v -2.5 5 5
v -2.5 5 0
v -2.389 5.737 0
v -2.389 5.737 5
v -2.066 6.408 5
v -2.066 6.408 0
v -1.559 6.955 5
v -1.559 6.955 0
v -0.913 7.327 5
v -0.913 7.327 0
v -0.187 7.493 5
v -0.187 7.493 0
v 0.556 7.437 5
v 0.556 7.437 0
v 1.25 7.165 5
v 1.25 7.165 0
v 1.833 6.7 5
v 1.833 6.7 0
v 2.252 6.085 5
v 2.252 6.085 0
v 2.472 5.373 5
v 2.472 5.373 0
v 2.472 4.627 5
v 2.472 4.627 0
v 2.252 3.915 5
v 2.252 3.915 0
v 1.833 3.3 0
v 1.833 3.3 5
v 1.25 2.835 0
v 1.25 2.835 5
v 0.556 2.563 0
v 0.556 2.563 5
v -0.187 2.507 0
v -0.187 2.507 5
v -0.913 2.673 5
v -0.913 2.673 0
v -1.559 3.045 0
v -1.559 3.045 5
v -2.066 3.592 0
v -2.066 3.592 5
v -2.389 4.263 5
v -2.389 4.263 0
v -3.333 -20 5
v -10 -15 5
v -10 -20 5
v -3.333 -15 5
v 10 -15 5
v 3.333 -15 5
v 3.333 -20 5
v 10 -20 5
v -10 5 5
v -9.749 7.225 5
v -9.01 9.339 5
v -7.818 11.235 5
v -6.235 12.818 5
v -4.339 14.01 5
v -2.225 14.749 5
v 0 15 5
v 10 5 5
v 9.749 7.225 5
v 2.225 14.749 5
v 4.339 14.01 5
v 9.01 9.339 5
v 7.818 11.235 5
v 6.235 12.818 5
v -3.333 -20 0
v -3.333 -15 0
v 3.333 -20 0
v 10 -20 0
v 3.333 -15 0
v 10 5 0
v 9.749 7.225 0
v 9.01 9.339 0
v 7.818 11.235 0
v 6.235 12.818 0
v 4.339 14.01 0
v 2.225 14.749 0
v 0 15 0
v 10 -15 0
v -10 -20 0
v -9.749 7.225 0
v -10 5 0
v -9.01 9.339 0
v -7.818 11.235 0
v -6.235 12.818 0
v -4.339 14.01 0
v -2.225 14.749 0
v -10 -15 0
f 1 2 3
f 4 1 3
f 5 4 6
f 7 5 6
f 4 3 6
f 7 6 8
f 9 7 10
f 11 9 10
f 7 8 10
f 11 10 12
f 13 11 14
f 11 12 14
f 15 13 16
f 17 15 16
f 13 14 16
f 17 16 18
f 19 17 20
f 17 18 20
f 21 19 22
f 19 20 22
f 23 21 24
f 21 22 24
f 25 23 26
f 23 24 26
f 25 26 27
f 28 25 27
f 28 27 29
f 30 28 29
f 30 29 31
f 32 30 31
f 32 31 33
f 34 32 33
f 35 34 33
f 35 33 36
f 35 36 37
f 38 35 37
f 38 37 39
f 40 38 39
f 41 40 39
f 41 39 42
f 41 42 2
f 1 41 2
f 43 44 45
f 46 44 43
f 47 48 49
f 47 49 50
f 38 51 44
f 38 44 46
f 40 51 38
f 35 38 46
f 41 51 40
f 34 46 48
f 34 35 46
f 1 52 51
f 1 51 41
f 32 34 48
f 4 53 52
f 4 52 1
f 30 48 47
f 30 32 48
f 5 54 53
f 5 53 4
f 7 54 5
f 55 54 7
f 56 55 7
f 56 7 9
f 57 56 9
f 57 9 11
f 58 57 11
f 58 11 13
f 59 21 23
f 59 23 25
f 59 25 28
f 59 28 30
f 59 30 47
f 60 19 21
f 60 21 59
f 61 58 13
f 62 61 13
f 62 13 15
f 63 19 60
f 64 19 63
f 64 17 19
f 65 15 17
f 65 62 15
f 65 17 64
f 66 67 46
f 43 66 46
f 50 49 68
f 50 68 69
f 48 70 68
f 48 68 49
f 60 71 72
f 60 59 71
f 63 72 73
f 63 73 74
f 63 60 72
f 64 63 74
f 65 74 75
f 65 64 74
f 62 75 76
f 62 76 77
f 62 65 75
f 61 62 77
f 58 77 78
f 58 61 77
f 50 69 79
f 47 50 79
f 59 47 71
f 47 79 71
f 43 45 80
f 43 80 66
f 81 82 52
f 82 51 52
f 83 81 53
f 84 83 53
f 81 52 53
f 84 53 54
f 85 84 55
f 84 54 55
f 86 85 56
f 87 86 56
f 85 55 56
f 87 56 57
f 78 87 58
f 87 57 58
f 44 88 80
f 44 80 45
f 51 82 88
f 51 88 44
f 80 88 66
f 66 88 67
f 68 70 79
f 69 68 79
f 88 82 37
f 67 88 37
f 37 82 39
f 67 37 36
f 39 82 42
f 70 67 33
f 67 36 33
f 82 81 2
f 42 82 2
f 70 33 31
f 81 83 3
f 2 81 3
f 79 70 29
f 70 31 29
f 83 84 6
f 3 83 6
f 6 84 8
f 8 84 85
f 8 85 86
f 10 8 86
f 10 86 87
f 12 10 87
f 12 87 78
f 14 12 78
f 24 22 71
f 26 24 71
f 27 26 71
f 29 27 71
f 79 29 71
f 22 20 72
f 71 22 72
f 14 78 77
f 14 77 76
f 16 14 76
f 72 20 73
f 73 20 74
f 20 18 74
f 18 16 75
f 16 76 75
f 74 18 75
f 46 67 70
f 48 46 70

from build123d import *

# Parameters (mm, degrees)
SKETCH1_W           = 20
SKETCH1_H           = 30
BOSS_EXTRUDE1_DEPTH = 5
FILLET2_R           = 10
SKETCH2_R           = 2.5
CUT_EXTRUDE1_DEPTH  = 19.708286934
SKETCH3_W           = 6.666666667
SKETCH3_H           = 5
BOSS_EXTRUDE2_DEPTH = 5


with BuildPart() as part:
    # Sketch1 → Boss-Extrude1 (new body)
    with BuildSketch(Plane.XY):
        Rectangle(SKETCH1_W, SKETCH1_H)
    extrude(amount=BOSS_EXTRUDE1_DEPTH)

    # Fillet2
    fillet2_edges = [part.edges().sort_by_distance(p)[0] for p in [
        (-10, 15, 2.5),
        (10, 15, 2.5),
    ]]
    fillet(fillet2_edges, radius=FILLET2_R - 0.0001)  # a hair under: the kernel refuses the full size

    # Sketch2 → Cut-Extrude1 (cut, through all)
    with BuildSketch(Plane(origin=(0, 0, 0), x_dir=(-1, 0, 0), z_dir=(0, 0, -1))):
        with Locations((0, 5)):
            Circle(SKETCH2_R)
    extrude(amount=-CUT_EXTRUDE1_DEPTH, mode=Mode.SUBTRACT)

    # Sketch3 → Boss-Extrude2 (add)
    with BuildSketch(Plane.XZ.offset(15)):
        with Locations((-6.666666667, 2.5)):
            Rectangle(SKETCH3_W, SKETCH3_H)
        with Locations((6.666666667, 2.5)):
            Rectangle(SKETCH3_W, SKETCH3_H)
    extrude(amount=BOSS_EXTRUDE2_DEPTH)


solid = part.part
